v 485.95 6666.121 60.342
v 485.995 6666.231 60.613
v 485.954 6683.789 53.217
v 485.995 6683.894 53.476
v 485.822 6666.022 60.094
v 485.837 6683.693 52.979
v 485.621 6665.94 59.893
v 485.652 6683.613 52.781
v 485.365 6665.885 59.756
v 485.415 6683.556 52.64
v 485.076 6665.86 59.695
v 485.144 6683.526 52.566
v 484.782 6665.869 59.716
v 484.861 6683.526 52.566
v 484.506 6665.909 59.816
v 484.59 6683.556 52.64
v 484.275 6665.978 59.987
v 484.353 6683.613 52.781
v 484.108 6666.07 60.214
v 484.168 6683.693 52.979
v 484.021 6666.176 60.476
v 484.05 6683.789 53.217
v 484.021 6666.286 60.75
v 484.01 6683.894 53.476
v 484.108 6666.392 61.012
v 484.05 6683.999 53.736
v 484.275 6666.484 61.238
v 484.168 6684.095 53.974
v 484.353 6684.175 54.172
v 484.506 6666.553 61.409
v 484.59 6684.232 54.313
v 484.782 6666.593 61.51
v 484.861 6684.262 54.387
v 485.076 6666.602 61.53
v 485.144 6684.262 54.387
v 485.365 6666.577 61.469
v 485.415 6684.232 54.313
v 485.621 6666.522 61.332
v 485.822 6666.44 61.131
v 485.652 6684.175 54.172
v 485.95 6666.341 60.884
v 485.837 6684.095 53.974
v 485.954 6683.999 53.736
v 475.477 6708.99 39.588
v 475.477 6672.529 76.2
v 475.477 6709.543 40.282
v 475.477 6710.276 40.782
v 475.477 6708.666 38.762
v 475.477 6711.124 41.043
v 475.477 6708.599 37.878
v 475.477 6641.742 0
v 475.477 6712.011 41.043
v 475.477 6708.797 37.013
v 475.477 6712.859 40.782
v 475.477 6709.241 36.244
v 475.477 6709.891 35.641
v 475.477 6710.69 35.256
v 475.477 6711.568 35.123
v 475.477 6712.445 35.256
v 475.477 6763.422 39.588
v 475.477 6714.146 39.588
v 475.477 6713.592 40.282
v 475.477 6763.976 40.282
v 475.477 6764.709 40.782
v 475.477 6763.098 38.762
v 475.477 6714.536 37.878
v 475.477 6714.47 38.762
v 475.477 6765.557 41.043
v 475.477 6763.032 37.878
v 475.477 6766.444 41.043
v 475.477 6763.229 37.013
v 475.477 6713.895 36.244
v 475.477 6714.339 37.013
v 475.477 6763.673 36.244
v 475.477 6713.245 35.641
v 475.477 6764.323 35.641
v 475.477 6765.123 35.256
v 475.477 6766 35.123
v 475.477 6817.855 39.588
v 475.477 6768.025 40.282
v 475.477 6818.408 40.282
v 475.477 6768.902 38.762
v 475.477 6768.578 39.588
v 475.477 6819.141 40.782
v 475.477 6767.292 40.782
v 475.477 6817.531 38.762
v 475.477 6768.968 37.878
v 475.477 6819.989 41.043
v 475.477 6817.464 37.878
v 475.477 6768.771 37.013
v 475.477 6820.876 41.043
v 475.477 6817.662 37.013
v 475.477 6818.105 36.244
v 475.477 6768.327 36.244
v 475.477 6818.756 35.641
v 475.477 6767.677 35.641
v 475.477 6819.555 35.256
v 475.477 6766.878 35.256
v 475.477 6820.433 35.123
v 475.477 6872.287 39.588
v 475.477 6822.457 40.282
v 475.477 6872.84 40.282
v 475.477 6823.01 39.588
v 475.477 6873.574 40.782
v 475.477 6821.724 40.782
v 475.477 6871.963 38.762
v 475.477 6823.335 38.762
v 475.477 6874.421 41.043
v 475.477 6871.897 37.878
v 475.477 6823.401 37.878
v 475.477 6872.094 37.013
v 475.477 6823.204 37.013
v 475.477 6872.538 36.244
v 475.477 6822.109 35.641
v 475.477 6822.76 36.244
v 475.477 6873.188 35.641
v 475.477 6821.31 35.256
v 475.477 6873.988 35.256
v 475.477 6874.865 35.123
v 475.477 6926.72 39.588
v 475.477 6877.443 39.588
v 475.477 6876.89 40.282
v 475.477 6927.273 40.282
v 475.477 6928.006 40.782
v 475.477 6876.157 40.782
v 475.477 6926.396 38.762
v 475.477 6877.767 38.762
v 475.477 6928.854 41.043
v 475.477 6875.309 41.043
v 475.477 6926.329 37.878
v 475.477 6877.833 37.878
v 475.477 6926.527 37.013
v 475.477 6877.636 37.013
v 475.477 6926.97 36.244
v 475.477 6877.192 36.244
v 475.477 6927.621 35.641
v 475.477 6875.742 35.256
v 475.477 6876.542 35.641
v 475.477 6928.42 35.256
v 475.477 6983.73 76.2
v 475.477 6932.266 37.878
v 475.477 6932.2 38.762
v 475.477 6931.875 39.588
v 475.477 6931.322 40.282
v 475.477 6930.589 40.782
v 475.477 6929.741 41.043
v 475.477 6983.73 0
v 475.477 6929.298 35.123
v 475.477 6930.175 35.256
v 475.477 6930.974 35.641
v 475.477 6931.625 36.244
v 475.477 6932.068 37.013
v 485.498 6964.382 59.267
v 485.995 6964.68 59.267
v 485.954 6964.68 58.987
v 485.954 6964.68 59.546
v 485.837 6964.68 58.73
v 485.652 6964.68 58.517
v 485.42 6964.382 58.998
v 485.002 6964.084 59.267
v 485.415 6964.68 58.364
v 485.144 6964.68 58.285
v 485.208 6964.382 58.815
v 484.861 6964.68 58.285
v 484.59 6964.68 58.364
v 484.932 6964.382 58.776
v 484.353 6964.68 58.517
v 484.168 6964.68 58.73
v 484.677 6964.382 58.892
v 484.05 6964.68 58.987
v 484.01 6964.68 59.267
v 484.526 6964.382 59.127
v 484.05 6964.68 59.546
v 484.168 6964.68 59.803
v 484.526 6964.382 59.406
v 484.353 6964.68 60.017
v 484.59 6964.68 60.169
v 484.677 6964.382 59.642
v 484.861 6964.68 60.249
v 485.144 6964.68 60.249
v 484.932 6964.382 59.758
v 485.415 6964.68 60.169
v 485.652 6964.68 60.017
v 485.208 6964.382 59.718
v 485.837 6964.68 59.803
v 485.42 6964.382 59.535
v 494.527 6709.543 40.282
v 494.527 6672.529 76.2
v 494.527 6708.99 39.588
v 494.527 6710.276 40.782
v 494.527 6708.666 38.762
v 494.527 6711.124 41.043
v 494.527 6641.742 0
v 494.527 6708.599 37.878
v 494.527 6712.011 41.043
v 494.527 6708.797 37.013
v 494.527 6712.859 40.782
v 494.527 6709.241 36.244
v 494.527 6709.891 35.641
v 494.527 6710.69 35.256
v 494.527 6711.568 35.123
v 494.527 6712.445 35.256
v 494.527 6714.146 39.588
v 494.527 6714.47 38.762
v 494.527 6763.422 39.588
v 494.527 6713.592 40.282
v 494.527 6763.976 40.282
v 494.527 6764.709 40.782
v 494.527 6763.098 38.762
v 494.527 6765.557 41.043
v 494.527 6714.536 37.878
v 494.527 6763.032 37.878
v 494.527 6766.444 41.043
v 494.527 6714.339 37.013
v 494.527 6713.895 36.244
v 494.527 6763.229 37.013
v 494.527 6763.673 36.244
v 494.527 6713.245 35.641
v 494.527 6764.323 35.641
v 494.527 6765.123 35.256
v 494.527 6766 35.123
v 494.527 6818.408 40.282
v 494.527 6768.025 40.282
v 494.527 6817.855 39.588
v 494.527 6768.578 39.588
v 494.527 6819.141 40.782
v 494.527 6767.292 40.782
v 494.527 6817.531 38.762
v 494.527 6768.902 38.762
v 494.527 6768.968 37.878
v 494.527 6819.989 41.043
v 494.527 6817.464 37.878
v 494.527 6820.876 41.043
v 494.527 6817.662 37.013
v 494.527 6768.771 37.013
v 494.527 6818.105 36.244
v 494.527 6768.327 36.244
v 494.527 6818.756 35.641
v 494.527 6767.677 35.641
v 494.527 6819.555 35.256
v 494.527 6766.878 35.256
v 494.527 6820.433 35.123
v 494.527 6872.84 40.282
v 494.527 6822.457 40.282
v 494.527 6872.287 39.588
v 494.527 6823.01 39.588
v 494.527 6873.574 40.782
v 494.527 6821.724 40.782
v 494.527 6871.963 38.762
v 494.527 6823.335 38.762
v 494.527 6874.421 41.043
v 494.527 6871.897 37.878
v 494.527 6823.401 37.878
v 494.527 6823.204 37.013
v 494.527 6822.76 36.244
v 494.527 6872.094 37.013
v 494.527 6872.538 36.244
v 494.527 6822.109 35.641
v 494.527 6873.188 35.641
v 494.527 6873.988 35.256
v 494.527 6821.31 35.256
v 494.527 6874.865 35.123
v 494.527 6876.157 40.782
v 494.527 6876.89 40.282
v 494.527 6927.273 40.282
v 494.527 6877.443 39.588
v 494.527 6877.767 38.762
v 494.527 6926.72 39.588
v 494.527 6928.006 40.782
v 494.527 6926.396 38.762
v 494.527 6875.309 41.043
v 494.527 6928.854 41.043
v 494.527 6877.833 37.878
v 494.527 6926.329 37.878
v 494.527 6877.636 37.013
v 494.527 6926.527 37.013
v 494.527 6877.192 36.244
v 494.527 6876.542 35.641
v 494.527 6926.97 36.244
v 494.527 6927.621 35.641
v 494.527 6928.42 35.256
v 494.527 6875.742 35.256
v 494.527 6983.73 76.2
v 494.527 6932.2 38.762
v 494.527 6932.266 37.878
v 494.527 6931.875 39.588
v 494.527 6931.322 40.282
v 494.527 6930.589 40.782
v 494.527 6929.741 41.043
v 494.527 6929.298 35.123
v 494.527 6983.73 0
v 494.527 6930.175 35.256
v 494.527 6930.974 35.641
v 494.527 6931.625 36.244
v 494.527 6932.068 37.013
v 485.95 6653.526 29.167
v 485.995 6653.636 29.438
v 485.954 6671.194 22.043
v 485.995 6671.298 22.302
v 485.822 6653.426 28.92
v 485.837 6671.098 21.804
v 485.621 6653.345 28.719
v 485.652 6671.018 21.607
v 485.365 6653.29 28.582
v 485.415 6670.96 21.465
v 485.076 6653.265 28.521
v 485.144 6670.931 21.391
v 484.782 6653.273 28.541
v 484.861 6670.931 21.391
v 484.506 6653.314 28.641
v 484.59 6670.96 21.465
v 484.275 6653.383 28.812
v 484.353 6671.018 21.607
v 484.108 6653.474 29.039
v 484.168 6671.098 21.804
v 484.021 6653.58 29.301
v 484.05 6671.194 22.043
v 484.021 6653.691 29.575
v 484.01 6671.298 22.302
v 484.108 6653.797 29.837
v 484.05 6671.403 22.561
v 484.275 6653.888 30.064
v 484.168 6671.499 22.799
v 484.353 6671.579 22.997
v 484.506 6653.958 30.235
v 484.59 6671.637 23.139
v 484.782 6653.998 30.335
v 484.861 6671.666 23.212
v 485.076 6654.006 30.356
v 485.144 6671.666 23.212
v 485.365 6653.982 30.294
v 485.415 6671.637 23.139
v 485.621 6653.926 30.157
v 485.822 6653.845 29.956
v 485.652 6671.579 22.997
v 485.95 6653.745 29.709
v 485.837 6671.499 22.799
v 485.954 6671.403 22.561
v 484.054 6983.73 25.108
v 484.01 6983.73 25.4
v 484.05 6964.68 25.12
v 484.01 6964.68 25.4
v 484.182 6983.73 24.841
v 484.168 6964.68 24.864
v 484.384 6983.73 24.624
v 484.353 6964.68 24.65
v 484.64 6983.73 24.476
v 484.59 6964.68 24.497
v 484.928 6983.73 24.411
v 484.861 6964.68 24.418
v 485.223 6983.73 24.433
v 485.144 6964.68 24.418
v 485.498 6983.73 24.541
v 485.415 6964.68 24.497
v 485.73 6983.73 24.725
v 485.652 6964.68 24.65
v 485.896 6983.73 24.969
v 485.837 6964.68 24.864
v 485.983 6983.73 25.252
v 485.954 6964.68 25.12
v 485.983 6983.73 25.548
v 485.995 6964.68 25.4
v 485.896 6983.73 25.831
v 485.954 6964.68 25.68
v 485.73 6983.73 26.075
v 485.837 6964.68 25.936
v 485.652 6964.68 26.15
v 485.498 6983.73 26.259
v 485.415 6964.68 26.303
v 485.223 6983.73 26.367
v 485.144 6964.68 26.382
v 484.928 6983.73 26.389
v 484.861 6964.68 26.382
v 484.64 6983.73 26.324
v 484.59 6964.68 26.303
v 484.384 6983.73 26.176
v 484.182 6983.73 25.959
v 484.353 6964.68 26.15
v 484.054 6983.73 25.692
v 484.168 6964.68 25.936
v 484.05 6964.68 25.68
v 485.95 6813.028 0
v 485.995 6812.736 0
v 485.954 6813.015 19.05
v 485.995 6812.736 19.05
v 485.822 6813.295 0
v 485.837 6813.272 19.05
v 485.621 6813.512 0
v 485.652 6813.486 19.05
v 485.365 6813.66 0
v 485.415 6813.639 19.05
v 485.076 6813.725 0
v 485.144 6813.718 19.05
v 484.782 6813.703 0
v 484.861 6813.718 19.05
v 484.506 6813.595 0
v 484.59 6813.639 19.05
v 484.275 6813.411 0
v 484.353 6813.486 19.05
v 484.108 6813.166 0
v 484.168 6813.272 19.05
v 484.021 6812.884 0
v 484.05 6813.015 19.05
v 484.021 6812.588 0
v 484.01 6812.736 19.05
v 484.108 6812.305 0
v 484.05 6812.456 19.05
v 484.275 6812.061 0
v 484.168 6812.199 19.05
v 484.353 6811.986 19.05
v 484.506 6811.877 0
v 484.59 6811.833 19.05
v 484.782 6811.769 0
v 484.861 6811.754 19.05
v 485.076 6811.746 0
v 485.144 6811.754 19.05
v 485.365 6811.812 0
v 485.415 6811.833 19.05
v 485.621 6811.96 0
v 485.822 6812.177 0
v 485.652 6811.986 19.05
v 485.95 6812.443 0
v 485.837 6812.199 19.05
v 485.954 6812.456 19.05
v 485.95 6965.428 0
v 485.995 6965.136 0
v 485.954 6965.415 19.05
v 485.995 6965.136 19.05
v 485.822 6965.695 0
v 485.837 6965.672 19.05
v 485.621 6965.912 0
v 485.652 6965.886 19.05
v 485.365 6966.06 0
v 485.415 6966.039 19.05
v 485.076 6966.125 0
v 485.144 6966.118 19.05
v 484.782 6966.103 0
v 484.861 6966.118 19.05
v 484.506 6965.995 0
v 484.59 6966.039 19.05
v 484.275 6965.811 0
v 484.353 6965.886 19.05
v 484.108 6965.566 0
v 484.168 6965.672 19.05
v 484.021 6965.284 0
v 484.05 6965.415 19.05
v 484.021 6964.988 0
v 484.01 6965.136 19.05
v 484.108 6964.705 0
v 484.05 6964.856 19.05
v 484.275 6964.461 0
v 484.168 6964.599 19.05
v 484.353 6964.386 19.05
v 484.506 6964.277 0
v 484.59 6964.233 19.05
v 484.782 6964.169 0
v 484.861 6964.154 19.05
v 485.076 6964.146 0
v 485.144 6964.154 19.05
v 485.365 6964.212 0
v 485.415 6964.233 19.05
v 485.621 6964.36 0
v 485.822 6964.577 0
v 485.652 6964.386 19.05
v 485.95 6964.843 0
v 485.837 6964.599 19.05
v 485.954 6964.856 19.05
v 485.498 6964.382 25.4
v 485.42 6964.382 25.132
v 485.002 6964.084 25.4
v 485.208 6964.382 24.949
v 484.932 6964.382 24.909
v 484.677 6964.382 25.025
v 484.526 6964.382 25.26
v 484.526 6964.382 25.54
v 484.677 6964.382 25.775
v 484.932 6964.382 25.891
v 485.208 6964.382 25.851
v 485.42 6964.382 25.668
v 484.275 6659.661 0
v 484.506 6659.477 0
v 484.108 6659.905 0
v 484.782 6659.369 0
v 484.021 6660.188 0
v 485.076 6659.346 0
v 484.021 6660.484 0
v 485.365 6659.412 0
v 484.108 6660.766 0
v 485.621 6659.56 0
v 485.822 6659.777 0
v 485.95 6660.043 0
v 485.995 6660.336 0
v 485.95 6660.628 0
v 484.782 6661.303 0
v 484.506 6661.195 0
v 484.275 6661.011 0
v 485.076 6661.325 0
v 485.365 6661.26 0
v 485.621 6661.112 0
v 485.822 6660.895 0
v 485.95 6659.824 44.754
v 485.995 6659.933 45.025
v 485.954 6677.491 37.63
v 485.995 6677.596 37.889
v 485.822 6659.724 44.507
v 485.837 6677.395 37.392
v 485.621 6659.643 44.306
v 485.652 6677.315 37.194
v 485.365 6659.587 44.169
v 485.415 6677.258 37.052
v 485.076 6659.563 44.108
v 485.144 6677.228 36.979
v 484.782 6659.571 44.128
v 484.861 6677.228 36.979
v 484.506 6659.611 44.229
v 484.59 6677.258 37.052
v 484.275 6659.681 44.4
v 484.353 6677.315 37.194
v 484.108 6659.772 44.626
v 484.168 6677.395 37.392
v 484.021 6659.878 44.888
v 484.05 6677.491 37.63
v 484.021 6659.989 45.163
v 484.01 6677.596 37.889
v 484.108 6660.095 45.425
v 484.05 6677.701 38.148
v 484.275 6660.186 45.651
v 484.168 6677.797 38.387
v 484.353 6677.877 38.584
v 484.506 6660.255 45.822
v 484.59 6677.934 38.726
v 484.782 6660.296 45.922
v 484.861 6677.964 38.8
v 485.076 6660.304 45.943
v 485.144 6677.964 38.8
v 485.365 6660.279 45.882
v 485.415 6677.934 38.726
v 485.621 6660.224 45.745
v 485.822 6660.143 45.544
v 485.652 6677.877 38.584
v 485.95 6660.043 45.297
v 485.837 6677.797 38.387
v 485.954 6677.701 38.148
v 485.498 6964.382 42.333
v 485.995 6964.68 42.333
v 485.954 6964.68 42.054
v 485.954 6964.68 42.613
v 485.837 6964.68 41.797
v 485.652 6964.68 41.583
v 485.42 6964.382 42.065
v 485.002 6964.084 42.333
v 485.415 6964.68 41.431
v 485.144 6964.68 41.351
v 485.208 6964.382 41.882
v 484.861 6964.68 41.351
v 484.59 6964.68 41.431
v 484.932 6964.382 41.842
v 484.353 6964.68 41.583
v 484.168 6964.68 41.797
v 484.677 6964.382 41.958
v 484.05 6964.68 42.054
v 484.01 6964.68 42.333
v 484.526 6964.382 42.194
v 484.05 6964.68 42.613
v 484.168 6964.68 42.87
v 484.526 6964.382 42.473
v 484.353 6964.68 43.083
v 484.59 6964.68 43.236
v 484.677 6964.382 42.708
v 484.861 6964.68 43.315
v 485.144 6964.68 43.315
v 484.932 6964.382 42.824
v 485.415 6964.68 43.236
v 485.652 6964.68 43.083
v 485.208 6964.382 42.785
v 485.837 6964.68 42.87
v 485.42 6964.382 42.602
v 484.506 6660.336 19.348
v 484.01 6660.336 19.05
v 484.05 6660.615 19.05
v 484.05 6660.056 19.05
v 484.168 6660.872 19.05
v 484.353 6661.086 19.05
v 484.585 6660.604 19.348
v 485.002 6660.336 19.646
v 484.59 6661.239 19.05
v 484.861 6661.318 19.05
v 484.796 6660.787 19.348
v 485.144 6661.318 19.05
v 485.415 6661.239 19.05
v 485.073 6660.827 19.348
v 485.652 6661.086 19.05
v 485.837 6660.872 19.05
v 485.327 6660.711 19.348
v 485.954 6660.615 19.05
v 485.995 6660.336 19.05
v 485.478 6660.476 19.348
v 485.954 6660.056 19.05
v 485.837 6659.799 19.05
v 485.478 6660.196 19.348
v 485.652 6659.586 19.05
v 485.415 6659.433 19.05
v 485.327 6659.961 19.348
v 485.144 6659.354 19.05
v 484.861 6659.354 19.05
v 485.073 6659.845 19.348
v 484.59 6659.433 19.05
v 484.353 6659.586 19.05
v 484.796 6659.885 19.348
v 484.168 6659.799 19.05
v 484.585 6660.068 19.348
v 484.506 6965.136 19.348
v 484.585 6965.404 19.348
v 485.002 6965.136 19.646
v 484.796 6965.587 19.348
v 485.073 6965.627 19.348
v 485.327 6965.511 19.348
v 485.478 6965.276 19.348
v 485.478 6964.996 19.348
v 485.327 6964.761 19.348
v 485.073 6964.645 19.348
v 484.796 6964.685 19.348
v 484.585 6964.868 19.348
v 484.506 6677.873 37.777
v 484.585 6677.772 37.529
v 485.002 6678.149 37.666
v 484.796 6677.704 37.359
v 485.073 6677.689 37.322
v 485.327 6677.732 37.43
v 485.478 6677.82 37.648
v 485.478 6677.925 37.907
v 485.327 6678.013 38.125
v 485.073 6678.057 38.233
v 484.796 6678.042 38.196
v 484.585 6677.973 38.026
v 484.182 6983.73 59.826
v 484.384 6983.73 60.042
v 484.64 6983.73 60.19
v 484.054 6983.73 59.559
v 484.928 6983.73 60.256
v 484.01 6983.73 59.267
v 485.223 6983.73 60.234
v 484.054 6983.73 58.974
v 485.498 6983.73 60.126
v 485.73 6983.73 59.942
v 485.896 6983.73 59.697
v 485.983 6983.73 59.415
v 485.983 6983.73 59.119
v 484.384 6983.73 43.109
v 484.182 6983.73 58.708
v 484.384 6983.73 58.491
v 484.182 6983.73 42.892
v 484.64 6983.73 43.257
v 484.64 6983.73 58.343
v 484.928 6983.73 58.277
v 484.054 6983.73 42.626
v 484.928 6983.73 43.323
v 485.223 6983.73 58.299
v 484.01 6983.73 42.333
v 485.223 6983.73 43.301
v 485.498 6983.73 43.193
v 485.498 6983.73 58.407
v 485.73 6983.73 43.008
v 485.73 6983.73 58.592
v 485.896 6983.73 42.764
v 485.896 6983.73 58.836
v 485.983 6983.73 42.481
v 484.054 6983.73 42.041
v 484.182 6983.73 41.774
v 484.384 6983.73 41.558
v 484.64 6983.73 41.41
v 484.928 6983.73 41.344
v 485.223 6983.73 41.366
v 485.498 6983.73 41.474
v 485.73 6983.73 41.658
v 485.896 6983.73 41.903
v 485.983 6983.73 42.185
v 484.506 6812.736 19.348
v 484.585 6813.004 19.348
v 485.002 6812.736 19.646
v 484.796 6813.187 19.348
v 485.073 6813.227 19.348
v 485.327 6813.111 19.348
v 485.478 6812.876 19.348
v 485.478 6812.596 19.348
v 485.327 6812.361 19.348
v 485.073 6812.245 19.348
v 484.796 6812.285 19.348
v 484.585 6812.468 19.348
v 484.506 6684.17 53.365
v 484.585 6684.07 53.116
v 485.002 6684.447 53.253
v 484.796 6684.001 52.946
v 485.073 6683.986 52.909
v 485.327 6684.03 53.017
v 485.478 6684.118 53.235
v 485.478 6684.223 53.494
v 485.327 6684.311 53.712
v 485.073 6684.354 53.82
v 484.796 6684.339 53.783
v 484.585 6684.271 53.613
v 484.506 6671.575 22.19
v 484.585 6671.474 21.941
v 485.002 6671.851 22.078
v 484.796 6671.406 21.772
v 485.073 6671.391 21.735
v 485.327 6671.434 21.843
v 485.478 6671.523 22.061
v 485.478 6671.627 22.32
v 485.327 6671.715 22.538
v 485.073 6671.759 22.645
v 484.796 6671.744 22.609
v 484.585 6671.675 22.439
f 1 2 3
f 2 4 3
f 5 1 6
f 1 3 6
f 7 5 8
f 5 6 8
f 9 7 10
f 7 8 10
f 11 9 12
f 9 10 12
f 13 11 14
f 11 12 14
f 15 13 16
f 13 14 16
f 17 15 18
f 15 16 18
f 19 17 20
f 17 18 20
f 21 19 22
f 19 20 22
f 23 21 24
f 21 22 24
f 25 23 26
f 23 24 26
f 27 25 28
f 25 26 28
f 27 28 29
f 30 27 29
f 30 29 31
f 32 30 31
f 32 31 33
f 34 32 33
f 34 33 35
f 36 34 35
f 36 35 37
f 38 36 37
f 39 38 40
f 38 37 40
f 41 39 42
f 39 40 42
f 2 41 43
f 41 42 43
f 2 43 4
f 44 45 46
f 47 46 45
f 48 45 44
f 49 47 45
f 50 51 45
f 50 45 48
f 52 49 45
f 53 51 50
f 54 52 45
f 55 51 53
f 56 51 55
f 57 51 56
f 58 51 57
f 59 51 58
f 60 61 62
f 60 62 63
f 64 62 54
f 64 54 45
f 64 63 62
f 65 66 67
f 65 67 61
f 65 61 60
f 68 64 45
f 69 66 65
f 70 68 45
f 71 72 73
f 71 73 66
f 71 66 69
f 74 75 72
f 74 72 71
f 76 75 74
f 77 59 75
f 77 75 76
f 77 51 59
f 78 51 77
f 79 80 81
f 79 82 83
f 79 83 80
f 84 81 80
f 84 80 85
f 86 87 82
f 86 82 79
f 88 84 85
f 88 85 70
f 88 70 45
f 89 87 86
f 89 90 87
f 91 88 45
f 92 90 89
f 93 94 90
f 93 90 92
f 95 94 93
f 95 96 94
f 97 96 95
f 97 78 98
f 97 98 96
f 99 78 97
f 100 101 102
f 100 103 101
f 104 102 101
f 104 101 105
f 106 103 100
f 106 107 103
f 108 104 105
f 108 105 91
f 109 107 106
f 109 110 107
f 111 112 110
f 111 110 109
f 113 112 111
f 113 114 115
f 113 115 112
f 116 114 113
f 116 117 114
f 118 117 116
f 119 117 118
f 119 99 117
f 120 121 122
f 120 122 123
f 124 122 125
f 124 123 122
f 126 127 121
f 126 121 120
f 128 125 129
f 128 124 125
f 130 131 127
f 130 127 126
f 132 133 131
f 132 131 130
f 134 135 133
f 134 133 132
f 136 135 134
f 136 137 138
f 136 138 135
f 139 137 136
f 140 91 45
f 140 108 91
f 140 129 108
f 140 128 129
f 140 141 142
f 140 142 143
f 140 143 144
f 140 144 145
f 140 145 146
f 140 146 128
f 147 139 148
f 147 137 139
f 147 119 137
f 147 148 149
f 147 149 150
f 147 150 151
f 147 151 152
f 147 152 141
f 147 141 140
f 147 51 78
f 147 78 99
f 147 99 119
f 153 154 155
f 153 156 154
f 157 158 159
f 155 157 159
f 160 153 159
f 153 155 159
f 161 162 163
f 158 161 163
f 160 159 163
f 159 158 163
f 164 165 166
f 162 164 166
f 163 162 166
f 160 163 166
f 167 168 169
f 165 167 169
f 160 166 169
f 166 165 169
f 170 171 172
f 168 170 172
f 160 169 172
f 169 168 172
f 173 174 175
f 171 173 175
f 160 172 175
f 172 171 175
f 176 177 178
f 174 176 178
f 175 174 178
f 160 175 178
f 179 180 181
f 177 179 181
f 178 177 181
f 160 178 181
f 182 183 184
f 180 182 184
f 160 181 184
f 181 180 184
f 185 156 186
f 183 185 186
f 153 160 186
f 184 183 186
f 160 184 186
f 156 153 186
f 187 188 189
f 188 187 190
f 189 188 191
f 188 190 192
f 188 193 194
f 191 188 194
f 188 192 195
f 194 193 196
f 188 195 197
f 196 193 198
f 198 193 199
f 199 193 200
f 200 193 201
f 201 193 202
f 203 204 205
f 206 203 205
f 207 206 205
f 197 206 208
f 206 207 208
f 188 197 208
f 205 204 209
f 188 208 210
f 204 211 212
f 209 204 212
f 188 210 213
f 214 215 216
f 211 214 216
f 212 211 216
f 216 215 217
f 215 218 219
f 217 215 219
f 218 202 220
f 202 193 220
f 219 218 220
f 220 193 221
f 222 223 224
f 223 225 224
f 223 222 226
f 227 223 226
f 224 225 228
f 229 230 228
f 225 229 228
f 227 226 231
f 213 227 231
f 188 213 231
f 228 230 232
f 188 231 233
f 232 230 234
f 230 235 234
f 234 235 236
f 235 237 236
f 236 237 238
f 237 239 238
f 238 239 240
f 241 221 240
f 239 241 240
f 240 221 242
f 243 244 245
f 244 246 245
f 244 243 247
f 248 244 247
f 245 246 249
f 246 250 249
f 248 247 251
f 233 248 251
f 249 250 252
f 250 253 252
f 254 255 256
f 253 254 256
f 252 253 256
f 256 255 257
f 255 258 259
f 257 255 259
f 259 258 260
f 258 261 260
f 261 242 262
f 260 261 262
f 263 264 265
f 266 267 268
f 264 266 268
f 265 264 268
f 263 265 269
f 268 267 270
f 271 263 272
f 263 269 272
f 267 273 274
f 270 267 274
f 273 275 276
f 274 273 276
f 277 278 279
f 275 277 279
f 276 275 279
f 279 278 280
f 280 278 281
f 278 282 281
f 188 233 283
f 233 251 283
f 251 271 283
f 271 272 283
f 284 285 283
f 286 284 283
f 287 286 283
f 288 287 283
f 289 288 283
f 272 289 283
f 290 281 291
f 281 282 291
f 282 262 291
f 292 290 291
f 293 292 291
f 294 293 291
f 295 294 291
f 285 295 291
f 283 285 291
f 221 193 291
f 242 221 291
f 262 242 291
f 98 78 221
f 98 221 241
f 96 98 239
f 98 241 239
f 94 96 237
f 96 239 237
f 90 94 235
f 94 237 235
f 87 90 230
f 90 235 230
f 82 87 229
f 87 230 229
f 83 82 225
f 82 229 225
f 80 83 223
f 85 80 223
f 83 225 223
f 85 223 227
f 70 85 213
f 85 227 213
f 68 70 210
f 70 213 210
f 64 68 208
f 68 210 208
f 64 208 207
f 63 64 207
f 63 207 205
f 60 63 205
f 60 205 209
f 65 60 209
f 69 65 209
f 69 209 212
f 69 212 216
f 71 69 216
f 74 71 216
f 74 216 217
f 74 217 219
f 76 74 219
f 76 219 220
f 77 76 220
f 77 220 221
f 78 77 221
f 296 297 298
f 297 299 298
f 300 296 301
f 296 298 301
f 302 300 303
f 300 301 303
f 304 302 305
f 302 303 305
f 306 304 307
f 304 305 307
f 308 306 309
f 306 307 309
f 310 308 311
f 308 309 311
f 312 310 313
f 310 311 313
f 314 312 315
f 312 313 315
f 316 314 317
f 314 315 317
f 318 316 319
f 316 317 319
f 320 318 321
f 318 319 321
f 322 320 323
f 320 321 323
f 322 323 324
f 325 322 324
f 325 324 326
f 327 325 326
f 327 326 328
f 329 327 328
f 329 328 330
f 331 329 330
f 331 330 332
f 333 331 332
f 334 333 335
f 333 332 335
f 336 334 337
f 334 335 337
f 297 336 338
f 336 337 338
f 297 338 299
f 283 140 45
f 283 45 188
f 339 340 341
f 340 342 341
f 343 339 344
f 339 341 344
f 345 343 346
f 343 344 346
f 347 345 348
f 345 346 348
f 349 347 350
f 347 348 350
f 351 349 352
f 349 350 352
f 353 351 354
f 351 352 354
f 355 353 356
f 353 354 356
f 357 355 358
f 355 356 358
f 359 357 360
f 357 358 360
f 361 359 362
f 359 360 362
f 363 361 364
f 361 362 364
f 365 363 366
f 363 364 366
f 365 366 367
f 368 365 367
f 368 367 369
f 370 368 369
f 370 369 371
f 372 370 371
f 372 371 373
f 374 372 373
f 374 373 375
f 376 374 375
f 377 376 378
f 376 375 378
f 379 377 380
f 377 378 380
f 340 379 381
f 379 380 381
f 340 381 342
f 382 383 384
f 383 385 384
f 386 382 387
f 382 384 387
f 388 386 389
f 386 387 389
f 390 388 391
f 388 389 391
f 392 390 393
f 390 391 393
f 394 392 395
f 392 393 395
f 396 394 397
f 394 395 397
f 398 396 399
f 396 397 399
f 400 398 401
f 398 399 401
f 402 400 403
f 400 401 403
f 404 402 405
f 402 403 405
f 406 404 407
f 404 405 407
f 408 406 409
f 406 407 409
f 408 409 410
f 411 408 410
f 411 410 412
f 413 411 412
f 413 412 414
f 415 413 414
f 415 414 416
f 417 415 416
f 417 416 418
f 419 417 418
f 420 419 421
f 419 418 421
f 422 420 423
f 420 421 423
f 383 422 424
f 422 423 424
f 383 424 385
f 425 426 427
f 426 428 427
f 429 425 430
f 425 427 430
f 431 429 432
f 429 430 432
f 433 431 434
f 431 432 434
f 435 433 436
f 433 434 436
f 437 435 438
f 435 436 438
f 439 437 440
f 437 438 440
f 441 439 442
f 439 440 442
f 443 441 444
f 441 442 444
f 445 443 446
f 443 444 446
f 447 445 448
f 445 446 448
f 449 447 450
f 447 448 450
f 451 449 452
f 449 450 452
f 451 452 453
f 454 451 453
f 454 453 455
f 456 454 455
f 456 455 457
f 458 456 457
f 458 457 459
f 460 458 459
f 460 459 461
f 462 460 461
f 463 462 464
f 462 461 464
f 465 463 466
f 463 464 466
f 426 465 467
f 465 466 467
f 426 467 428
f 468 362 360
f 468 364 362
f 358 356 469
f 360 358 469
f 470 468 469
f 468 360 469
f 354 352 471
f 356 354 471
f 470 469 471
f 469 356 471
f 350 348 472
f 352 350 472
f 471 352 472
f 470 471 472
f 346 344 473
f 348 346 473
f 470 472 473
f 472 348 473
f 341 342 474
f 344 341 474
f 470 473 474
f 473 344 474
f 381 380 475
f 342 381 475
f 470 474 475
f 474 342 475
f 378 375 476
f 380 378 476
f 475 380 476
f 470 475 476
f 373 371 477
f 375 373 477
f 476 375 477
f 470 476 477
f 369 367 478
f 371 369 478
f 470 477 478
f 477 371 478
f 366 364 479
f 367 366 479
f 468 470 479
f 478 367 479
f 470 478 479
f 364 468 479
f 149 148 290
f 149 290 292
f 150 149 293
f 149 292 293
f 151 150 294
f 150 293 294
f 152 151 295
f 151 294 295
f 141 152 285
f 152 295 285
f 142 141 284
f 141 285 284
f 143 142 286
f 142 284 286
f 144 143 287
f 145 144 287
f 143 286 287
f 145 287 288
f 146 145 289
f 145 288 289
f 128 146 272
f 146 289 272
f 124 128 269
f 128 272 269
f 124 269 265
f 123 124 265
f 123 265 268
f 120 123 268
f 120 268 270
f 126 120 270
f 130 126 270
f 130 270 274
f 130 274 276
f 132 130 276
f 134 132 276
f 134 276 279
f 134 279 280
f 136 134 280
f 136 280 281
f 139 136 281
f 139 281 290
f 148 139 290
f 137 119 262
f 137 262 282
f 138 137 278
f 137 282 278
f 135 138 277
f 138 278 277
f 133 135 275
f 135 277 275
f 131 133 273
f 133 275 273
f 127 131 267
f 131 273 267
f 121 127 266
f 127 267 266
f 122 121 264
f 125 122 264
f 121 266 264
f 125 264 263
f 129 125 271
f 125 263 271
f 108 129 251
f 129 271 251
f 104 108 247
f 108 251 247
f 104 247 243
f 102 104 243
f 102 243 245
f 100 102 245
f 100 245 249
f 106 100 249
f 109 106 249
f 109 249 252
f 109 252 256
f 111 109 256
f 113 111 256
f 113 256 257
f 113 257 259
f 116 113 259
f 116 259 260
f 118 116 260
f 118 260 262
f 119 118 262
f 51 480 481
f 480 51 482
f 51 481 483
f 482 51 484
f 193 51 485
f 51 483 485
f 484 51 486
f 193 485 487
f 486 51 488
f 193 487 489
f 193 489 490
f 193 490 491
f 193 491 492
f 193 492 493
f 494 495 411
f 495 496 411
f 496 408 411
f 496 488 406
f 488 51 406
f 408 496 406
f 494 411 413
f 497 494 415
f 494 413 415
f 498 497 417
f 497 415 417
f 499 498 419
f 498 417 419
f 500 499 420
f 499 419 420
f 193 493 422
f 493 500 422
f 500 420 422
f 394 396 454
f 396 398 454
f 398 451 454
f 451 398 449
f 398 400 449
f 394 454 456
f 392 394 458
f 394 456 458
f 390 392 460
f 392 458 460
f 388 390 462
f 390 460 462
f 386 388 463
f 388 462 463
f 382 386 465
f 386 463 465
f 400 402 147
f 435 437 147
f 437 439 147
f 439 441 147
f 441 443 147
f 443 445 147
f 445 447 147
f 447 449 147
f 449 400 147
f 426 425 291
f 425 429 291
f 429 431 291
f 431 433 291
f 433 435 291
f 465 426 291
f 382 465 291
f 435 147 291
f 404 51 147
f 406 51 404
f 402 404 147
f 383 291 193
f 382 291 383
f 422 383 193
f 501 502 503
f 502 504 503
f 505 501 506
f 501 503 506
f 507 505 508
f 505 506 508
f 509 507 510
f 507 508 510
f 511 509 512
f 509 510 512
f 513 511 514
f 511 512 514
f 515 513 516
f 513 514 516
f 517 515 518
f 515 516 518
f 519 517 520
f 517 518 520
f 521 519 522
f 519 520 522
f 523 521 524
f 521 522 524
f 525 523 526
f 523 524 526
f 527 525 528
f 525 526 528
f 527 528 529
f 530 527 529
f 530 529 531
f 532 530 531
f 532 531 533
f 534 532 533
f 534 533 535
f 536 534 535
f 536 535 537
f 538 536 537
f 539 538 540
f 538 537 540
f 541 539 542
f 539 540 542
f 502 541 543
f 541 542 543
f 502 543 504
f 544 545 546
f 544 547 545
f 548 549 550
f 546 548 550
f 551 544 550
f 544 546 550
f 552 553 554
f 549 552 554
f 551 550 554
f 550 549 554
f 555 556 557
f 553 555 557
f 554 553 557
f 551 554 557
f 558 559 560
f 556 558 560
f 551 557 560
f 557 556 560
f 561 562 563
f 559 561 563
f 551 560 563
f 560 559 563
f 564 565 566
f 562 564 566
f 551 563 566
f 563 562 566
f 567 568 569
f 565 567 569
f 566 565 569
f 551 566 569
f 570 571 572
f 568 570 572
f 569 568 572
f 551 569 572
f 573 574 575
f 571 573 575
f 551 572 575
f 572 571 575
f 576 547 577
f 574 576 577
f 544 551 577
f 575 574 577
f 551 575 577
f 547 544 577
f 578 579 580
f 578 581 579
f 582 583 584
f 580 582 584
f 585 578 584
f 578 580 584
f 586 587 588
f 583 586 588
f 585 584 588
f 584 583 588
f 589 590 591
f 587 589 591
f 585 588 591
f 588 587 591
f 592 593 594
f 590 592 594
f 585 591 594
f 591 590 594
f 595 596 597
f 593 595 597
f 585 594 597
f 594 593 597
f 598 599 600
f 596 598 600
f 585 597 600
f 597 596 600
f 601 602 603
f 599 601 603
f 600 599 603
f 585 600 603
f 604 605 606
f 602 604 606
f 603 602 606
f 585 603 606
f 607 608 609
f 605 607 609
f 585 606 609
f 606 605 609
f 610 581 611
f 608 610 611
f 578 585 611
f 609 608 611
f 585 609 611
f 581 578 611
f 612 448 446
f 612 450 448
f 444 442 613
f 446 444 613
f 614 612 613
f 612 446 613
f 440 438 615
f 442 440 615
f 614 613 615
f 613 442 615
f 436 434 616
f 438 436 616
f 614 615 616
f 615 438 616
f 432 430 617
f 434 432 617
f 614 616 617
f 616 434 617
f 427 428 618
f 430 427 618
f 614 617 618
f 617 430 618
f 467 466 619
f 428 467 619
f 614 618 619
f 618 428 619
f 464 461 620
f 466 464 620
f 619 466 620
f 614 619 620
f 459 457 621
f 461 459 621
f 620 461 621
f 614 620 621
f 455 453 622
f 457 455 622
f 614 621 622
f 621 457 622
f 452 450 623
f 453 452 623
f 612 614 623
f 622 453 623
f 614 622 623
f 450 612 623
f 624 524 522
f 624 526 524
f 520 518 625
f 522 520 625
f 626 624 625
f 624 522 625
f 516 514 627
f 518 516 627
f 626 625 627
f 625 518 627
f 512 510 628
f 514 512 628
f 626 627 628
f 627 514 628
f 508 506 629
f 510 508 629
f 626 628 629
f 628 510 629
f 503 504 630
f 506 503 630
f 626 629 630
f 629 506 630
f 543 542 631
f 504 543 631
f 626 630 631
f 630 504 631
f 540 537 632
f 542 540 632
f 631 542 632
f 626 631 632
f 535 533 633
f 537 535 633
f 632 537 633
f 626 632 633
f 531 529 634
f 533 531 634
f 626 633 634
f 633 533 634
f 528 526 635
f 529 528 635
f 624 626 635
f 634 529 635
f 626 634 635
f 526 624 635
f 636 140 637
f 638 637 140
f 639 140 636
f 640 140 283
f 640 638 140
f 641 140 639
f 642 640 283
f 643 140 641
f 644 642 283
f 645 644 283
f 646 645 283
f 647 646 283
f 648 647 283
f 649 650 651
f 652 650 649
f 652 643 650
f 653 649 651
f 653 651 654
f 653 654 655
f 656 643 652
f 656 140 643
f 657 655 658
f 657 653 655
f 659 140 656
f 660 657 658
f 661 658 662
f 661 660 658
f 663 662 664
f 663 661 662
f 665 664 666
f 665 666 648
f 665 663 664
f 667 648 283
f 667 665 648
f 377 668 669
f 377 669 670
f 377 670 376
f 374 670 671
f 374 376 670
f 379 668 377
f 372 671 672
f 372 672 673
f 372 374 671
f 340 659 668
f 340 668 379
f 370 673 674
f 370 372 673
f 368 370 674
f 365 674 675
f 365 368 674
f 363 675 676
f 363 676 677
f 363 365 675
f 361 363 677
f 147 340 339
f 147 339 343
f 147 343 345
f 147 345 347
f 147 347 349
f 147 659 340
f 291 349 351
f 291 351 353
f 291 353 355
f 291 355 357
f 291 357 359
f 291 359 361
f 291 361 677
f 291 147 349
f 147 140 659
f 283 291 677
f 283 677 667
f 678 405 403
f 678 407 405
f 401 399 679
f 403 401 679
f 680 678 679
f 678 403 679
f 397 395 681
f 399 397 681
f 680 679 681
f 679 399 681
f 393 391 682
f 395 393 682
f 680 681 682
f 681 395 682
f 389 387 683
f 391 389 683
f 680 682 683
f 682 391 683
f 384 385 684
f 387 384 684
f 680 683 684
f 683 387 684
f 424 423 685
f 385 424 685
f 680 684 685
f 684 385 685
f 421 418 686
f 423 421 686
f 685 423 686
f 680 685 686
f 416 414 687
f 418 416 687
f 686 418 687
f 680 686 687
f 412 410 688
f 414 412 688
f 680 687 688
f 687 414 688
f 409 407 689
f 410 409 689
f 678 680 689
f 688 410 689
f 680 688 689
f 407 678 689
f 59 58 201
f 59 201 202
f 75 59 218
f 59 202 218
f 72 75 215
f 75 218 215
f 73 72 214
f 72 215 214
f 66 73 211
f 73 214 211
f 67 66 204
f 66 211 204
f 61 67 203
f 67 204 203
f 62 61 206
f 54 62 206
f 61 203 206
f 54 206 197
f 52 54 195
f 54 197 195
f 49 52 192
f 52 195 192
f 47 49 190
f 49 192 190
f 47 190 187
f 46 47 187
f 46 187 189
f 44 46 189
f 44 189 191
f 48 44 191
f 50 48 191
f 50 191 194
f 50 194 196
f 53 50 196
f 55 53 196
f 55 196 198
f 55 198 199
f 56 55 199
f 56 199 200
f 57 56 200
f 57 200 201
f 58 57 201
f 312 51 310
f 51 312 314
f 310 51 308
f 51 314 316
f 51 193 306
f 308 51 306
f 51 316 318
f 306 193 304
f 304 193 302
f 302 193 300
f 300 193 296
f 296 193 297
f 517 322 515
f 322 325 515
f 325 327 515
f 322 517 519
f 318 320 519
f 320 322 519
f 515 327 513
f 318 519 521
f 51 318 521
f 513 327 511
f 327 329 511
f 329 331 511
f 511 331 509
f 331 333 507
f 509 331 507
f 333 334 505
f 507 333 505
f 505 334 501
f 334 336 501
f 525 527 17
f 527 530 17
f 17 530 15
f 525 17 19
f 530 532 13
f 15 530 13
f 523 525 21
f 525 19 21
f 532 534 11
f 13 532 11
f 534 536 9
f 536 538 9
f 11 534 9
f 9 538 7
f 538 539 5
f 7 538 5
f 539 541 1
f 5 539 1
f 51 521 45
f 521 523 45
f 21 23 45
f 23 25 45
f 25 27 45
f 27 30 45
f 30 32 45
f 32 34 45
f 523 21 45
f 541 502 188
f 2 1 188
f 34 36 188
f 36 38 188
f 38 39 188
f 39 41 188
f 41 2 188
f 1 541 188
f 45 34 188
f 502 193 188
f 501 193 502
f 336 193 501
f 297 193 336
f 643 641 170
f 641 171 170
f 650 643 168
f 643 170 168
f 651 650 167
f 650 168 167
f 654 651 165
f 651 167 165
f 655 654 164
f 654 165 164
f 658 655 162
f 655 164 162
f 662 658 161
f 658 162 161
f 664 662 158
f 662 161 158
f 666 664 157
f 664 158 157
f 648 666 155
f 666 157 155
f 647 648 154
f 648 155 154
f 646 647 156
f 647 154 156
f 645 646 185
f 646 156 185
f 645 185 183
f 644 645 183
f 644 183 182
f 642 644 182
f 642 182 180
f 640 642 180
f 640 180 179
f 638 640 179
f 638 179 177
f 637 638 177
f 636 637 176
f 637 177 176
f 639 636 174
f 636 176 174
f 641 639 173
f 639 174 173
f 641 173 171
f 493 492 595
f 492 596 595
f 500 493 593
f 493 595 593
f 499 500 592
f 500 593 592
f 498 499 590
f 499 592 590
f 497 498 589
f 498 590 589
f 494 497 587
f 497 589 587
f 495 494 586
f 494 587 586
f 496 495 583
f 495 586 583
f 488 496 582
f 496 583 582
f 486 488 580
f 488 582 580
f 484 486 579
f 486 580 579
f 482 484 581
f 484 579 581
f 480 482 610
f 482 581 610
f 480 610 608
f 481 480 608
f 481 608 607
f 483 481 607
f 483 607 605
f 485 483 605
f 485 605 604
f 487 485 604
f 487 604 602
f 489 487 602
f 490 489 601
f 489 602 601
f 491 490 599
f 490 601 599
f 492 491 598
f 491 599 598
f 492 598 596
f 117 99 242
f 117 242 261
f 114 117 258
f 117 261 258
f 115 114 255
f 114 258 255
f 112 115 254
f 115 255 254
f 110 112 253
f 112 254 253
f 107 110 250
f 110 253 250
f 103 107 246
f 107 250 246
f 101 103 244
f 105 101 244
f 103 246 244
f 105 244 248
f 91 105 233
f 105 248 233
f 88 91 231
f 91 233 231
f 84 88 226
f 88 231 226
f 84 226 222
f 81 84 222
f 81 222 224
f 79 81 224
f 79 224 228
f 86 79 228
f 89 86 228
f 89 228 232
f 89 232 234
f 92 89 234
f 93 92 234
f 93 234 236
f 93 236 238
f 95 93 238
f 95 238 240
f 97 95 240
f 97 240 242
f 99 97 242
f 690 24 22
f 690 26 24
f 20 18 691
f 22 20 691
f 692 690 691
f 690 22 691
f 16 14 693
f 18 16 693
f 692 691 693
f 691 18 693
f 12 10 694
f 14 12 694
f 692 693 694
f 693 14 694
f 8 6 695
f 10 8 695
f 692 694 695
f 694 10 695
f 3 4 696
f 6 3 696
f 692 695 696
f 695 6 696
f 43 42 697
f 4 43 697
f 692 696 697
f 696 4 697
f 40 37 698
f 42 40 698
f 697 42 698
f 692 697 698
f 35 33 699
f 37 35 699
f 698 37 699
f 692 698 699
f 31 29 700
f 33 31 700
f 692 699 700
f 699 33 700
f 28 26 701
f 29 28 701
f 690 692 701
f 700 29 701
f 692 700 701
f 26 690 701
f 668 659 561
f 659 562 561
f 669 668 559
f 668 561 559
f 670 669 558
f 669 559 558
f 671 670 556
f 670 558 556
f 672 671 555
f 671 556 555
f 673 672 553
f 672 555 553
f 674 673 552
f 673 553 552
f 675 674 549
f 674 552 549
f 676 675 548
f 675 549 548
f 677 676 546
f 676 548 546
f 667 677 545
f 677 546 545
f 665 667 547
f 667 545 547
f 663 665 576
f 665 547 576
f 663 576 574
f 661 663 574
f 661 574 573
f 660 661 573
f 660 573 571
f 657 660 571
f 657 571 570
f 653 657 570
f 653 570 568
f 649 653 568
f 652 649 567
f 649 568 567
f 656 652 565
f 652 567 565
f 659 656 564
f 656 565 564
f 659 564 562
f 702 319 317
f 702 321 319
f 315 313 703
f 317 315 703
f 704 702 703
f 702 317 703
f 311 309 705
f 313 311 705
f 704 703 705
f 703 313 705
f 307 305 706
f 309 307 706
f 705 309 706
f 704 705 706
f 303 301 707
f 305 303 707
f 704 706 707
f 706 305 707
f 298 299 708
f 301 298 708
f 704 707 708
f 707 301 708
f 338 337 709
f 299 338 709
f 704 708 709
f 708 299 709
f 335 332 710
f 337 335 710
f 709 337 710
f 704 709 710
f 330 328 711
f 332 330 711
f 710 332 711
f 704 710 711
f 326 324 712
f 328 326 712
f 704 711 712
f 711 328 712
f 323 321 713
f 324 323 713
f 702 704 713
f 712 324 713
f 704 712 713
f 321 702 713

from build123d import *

# Parameters (mm, degrees)
SKETCH1_W                            = 19.05
SKETCH1_H                            = 341.988103331
BOSS_EXTRUDE1_DEPTH                  = 76.2
CUT_EXTRUDE1_REACH                   = 21.05
F_5_64_0_07813_DIAMETER_HOLE1_D      = 1.984502
F_5_64_0_07813_DIAMETER_HOLE1_DEPTH  = 38.1
F_5_64_0_07813_DIAMETER_HOLE1_TIP    = 0.59620455
F_5_64_0_07813_DIAMETER_HOLE2_D      = 1.984502
F_5_64_0_07813_DIAMETER_HOLE2_DEPTH  = 38.1
F_5_64_0_07813_DIAMETER_HOLE2_TIP    = 0.59620455
F_5_64_0_07813_DIAMETER_HOLE3_D      = 1.984502
F_5_64_0_07813_DIAMETER_HOLE3_DEPTH  = 19.05
F_5_64_0_07813_DIAMETER_HOLE3_TIP    = 0.59620455
F_5_64_0_07813_DIAMETER_HOLE4_D      = 1.984502
F_5_64_0_07813_DIAMETER_HOLE4_DEPTH  = 19.05
F_5_64_0_07813_DIAMETER_HOLE4_TIP    = 0.59620455
F_15_64_0_23438_DIAMETER_HOLE1_D     = 5.953252
F_15_64_0_23438_DIAMETER_HOLE1_DEPTH = 19.05


with BuildPart() as part:
    # Sketch1 → Boss-Extrude1 (new body)
    with BuildSketch(Plane.XY):
        with Locations((485.002307398, 6812.735938475)):
            Rectangle(SKETCH1_W, SKETCH1_H)
    extrude(amount=BOSS_EXTRUDE1_DEPTH)

    # Sketch2 → Cut-Extrude1 (cut, up to next)
    with BuildSketch(Plane(origin=(494.527307398, 0, 0), x_dir=(0, 0, -1), z_dir=(1, 0, 0)), mode=Mode.PRIVATE) as cut_extrude1_sk1:
        Polygon((0, 6641.741886809), (-76.2, 6672.528685257), (-76.2, 6641.741886809), align=None)
    cut_extrude1_tool1 = extrude(cut_extrude1_sk1.sketch, amount=-CUT_EXTRUDE1_REACH, mode=Mode.PRIVATE) & part.part
    add(cut_extrude1_tool1.solids().sort_by_distance((494.527307, 6652.004153, 50.8))[0], mode=Mode.SUBTRACT)

    # 5/64 (0.07813) Diameter Hole1
    with Locations(Plane(origin=(0, -8e-09, -19.049996974), x_dir=(-1, 0, 0), z_dir=(0, 0, -1))):
        with Locations((-481.589248274, 6993.254992531), (-386.339248274, 6993.254992531), (-291.089248274, 6993.254992531), (-295.274999999, 6965.135938475), (-295.274999999, 6812.735938475), (-295.274999999, 6660.335938474), (-285.166362357, 6631.468843414), (-475.477307398, 6631.468752771), (-485.002307398, 6660.335938474), (-485.002307398, 6812.735938474), (-485.002307398, 6965.135938474), (-478.365617646, 6611.6708), (-287.865617646, 6611.6708), (-307.975, 6564.3379), (-307.975, 6488.1379), (-284.960913066, 6440.805), (-380.210913066, 6440.805), (-475.460913066, 6440.805), (-446.831312422, 6488.1379), (-446.831312422, 6564.3379), (-472.231312422, 6396.355), (-472.231312422, 6320.155), (-472.653156211, 6275.705000839), (-377.403156211, 6275.705000839), (-282.153156211, 6275.705000839), (-282.575, 6320.155), (-282.575, 6396.355), (-435.598646187, 6221.729999816), (-435.598646187, 6145.529999816), (-450.592518112, 6091.554999951), (-460.998646187, 6091.555478285), (-460.998646187, 6056.629999944), (-460.998646187, 5980.429999944), (-460.998646187, 5945.505000042), (-282.153156211, 5945.505000042), (-368.611823093, 5945.505000042)):
            Hole(F_5_64_0_07813_DIAMETER_HOLE1_D / 2, depth=F_5_64_0_07813_DIAMETER_HOLE1_DEPTH)
            with Locations((0, 0, -(F_5_64_0_07813_DIAMETER_HOLE1_DEPTH + F_5_64_0_07813_DIAMETER_HOLE1_TIP / 2))):  # 118° drill point
                Cone(0, F_5_64_0_07813_DIAMETER_HOLE1_D / 2, F_5_64_0_07813_DIAMETER_HOLE1_TIP, mode=Mode.SUBTRACT)

    # 5/64 (0.07813) Diameter Hole2
    with Locations(Plane(origin=(189.727307399, 0, -19.050000054), x_dir=(-1, 0, 0), z_dir=(0, 0, -1))):
        with Locations((-481.589248274, 6993.254992531), (-386.339248274, 6993.254992531), (-291.089248274, 6993.254992531), (-295.274999999, 6965.135938475), (-295.274999999, 6812.735938475), (-295.274999999, 6660.335938474), (-285.166362357, 6631.468843414), (-475.477307398, 6631.468752771), (-485.002307398, 6660.335938474), (-485.002307398, 6812.735938474), (-485.002307398, 6965.135938474), (-478.365617646, 6611.6708), (-287.865617646, 6611.6708), (-307.975, 6564.3379), (-307.975, 6488.1379), (-284.960913066, 6440.805), (-380.210913066, 6440.805), (-475.460913066, 6440.805), (-446.831312422, 6488.1379), (-446.831312422, 6564.3379), (-472.231312422, 6396.355), (-472.231312422, 6320.155), (-472.653156211, 6275.705000839), (-377.403156211, 6275.705000839), (-282.153156211, 6275.705000839), (-282.575, 6320.155), (-282.575, 6396.355), (-435.598646187, 6221.729999816), (-435.598646187, 6145.529999816), (-450.592518112, 6091.554999951), (-460.998646187, 6091.555478285), (-460.998646187, 6056.629999944), (-460.998646187, 5980.429999944), (-460.998646187, 5945.505000042), (-282.153156211, 5945.505000042), (-368.611823093, 5945.505000042)):
            Hole(F_5_64_0_07813_DIAMETER_HOLE2_D / 2, depth=F_5_64_0_07813_DIAMETER_HOLE2_DEPTH)
            with Locations((0, 0, -(F_5_64_0_07813_DIAMETER_HOLE2_DEPTH + F_5_64_0_07813_DIAMETER_HOLE2_TIP / 2))):  # 118° drill point
                Cone(0, F_5_64_0_07813_DIAMETER_HOLE2_D / 2, F_5_64_0_07813_DIAMETER_HOLE2_TIP, mode=Mode.SUBTRACT)

    # 5/64 (0.07813) Diameter Hole3
    with Locations(Plane(origin=(-4e-09, 6983.72999014, 0), x_dir=(1, 0, 0), z_dir=(0, 1, 0))):
        with Locations((485.002307402, -59.266666667), (485.002307402, -25.4), (485.002307402, -42.333333333)):
            Hole(F_5_64_0_07813_DIAMETER_HOLE3_D / 2, depth=F_5_64_0_07813_DIAMETER_HOLE3_DEPTH)
            with Locations((0, 0, -(F_5_64_0_07813_DIAMETER_HOLE3_DEPTH + F_5_64_0_07813_DIAMETER_HOLE3_TIP / 2))):  # 118° drill point
                Cone(0, F_5_64_0_07813_DIAMETER_HOLE3_D / 2, F_5_64_0_07813_DIAMETER_HOLE3_TIP, mode=Mode.SUBTRACT)

    # 5/64 (0.07813) Diameter Hole4
    with Locations(Plane(origin=(0, 5709.705582748, -2306.870800158), x_dir=(-1, 0, 0), z_dir=(0, -0.927183854, 0.374606594))):
        with Locations((-485.002307398, -2519.790305282), (-485.002307398, -2553.413203553), (-485.002307398, -2536.601754417)):
            Hole(F_5_64_0_07813_DIAMETER_HOLE4_D / 2, depth=F_5_64_0_07813_DIAMETER_HOLE4_DEPTH)
            with Locations((0, 0, -(F_5_64_0_07813_DIAMETER_HOLE4_DEPTH + F_5_64_0_07813_DIAMETER_HOLE4_TIP / 2))):  # 118° drill point
                Cone(0, F_5_64_0_07813_DIAMETER_HOLE4_D / 2, F_5_64_0_07813_DIAMETER_HOLE4_TIP, mode=Mode.SUBTRACT)

    # 15/64 (0.23438) Diameter Hole1
    with Locations(Plane.ZY.offset(-475.477307398)):
        with Locations((38.1, 6711.567736717), (38.1, 6929.297539455), (38.1, 6874.865088771), (38.1, 6820.432638086), (38.1, 6766.000187402)):
            Hole(F_15_64_0_23438_DIAMETER_HOLE1_D / 2, depth=F_15_64_0_23438_DIAMETER_HOLE1_DEPTH)


solid = part.part
